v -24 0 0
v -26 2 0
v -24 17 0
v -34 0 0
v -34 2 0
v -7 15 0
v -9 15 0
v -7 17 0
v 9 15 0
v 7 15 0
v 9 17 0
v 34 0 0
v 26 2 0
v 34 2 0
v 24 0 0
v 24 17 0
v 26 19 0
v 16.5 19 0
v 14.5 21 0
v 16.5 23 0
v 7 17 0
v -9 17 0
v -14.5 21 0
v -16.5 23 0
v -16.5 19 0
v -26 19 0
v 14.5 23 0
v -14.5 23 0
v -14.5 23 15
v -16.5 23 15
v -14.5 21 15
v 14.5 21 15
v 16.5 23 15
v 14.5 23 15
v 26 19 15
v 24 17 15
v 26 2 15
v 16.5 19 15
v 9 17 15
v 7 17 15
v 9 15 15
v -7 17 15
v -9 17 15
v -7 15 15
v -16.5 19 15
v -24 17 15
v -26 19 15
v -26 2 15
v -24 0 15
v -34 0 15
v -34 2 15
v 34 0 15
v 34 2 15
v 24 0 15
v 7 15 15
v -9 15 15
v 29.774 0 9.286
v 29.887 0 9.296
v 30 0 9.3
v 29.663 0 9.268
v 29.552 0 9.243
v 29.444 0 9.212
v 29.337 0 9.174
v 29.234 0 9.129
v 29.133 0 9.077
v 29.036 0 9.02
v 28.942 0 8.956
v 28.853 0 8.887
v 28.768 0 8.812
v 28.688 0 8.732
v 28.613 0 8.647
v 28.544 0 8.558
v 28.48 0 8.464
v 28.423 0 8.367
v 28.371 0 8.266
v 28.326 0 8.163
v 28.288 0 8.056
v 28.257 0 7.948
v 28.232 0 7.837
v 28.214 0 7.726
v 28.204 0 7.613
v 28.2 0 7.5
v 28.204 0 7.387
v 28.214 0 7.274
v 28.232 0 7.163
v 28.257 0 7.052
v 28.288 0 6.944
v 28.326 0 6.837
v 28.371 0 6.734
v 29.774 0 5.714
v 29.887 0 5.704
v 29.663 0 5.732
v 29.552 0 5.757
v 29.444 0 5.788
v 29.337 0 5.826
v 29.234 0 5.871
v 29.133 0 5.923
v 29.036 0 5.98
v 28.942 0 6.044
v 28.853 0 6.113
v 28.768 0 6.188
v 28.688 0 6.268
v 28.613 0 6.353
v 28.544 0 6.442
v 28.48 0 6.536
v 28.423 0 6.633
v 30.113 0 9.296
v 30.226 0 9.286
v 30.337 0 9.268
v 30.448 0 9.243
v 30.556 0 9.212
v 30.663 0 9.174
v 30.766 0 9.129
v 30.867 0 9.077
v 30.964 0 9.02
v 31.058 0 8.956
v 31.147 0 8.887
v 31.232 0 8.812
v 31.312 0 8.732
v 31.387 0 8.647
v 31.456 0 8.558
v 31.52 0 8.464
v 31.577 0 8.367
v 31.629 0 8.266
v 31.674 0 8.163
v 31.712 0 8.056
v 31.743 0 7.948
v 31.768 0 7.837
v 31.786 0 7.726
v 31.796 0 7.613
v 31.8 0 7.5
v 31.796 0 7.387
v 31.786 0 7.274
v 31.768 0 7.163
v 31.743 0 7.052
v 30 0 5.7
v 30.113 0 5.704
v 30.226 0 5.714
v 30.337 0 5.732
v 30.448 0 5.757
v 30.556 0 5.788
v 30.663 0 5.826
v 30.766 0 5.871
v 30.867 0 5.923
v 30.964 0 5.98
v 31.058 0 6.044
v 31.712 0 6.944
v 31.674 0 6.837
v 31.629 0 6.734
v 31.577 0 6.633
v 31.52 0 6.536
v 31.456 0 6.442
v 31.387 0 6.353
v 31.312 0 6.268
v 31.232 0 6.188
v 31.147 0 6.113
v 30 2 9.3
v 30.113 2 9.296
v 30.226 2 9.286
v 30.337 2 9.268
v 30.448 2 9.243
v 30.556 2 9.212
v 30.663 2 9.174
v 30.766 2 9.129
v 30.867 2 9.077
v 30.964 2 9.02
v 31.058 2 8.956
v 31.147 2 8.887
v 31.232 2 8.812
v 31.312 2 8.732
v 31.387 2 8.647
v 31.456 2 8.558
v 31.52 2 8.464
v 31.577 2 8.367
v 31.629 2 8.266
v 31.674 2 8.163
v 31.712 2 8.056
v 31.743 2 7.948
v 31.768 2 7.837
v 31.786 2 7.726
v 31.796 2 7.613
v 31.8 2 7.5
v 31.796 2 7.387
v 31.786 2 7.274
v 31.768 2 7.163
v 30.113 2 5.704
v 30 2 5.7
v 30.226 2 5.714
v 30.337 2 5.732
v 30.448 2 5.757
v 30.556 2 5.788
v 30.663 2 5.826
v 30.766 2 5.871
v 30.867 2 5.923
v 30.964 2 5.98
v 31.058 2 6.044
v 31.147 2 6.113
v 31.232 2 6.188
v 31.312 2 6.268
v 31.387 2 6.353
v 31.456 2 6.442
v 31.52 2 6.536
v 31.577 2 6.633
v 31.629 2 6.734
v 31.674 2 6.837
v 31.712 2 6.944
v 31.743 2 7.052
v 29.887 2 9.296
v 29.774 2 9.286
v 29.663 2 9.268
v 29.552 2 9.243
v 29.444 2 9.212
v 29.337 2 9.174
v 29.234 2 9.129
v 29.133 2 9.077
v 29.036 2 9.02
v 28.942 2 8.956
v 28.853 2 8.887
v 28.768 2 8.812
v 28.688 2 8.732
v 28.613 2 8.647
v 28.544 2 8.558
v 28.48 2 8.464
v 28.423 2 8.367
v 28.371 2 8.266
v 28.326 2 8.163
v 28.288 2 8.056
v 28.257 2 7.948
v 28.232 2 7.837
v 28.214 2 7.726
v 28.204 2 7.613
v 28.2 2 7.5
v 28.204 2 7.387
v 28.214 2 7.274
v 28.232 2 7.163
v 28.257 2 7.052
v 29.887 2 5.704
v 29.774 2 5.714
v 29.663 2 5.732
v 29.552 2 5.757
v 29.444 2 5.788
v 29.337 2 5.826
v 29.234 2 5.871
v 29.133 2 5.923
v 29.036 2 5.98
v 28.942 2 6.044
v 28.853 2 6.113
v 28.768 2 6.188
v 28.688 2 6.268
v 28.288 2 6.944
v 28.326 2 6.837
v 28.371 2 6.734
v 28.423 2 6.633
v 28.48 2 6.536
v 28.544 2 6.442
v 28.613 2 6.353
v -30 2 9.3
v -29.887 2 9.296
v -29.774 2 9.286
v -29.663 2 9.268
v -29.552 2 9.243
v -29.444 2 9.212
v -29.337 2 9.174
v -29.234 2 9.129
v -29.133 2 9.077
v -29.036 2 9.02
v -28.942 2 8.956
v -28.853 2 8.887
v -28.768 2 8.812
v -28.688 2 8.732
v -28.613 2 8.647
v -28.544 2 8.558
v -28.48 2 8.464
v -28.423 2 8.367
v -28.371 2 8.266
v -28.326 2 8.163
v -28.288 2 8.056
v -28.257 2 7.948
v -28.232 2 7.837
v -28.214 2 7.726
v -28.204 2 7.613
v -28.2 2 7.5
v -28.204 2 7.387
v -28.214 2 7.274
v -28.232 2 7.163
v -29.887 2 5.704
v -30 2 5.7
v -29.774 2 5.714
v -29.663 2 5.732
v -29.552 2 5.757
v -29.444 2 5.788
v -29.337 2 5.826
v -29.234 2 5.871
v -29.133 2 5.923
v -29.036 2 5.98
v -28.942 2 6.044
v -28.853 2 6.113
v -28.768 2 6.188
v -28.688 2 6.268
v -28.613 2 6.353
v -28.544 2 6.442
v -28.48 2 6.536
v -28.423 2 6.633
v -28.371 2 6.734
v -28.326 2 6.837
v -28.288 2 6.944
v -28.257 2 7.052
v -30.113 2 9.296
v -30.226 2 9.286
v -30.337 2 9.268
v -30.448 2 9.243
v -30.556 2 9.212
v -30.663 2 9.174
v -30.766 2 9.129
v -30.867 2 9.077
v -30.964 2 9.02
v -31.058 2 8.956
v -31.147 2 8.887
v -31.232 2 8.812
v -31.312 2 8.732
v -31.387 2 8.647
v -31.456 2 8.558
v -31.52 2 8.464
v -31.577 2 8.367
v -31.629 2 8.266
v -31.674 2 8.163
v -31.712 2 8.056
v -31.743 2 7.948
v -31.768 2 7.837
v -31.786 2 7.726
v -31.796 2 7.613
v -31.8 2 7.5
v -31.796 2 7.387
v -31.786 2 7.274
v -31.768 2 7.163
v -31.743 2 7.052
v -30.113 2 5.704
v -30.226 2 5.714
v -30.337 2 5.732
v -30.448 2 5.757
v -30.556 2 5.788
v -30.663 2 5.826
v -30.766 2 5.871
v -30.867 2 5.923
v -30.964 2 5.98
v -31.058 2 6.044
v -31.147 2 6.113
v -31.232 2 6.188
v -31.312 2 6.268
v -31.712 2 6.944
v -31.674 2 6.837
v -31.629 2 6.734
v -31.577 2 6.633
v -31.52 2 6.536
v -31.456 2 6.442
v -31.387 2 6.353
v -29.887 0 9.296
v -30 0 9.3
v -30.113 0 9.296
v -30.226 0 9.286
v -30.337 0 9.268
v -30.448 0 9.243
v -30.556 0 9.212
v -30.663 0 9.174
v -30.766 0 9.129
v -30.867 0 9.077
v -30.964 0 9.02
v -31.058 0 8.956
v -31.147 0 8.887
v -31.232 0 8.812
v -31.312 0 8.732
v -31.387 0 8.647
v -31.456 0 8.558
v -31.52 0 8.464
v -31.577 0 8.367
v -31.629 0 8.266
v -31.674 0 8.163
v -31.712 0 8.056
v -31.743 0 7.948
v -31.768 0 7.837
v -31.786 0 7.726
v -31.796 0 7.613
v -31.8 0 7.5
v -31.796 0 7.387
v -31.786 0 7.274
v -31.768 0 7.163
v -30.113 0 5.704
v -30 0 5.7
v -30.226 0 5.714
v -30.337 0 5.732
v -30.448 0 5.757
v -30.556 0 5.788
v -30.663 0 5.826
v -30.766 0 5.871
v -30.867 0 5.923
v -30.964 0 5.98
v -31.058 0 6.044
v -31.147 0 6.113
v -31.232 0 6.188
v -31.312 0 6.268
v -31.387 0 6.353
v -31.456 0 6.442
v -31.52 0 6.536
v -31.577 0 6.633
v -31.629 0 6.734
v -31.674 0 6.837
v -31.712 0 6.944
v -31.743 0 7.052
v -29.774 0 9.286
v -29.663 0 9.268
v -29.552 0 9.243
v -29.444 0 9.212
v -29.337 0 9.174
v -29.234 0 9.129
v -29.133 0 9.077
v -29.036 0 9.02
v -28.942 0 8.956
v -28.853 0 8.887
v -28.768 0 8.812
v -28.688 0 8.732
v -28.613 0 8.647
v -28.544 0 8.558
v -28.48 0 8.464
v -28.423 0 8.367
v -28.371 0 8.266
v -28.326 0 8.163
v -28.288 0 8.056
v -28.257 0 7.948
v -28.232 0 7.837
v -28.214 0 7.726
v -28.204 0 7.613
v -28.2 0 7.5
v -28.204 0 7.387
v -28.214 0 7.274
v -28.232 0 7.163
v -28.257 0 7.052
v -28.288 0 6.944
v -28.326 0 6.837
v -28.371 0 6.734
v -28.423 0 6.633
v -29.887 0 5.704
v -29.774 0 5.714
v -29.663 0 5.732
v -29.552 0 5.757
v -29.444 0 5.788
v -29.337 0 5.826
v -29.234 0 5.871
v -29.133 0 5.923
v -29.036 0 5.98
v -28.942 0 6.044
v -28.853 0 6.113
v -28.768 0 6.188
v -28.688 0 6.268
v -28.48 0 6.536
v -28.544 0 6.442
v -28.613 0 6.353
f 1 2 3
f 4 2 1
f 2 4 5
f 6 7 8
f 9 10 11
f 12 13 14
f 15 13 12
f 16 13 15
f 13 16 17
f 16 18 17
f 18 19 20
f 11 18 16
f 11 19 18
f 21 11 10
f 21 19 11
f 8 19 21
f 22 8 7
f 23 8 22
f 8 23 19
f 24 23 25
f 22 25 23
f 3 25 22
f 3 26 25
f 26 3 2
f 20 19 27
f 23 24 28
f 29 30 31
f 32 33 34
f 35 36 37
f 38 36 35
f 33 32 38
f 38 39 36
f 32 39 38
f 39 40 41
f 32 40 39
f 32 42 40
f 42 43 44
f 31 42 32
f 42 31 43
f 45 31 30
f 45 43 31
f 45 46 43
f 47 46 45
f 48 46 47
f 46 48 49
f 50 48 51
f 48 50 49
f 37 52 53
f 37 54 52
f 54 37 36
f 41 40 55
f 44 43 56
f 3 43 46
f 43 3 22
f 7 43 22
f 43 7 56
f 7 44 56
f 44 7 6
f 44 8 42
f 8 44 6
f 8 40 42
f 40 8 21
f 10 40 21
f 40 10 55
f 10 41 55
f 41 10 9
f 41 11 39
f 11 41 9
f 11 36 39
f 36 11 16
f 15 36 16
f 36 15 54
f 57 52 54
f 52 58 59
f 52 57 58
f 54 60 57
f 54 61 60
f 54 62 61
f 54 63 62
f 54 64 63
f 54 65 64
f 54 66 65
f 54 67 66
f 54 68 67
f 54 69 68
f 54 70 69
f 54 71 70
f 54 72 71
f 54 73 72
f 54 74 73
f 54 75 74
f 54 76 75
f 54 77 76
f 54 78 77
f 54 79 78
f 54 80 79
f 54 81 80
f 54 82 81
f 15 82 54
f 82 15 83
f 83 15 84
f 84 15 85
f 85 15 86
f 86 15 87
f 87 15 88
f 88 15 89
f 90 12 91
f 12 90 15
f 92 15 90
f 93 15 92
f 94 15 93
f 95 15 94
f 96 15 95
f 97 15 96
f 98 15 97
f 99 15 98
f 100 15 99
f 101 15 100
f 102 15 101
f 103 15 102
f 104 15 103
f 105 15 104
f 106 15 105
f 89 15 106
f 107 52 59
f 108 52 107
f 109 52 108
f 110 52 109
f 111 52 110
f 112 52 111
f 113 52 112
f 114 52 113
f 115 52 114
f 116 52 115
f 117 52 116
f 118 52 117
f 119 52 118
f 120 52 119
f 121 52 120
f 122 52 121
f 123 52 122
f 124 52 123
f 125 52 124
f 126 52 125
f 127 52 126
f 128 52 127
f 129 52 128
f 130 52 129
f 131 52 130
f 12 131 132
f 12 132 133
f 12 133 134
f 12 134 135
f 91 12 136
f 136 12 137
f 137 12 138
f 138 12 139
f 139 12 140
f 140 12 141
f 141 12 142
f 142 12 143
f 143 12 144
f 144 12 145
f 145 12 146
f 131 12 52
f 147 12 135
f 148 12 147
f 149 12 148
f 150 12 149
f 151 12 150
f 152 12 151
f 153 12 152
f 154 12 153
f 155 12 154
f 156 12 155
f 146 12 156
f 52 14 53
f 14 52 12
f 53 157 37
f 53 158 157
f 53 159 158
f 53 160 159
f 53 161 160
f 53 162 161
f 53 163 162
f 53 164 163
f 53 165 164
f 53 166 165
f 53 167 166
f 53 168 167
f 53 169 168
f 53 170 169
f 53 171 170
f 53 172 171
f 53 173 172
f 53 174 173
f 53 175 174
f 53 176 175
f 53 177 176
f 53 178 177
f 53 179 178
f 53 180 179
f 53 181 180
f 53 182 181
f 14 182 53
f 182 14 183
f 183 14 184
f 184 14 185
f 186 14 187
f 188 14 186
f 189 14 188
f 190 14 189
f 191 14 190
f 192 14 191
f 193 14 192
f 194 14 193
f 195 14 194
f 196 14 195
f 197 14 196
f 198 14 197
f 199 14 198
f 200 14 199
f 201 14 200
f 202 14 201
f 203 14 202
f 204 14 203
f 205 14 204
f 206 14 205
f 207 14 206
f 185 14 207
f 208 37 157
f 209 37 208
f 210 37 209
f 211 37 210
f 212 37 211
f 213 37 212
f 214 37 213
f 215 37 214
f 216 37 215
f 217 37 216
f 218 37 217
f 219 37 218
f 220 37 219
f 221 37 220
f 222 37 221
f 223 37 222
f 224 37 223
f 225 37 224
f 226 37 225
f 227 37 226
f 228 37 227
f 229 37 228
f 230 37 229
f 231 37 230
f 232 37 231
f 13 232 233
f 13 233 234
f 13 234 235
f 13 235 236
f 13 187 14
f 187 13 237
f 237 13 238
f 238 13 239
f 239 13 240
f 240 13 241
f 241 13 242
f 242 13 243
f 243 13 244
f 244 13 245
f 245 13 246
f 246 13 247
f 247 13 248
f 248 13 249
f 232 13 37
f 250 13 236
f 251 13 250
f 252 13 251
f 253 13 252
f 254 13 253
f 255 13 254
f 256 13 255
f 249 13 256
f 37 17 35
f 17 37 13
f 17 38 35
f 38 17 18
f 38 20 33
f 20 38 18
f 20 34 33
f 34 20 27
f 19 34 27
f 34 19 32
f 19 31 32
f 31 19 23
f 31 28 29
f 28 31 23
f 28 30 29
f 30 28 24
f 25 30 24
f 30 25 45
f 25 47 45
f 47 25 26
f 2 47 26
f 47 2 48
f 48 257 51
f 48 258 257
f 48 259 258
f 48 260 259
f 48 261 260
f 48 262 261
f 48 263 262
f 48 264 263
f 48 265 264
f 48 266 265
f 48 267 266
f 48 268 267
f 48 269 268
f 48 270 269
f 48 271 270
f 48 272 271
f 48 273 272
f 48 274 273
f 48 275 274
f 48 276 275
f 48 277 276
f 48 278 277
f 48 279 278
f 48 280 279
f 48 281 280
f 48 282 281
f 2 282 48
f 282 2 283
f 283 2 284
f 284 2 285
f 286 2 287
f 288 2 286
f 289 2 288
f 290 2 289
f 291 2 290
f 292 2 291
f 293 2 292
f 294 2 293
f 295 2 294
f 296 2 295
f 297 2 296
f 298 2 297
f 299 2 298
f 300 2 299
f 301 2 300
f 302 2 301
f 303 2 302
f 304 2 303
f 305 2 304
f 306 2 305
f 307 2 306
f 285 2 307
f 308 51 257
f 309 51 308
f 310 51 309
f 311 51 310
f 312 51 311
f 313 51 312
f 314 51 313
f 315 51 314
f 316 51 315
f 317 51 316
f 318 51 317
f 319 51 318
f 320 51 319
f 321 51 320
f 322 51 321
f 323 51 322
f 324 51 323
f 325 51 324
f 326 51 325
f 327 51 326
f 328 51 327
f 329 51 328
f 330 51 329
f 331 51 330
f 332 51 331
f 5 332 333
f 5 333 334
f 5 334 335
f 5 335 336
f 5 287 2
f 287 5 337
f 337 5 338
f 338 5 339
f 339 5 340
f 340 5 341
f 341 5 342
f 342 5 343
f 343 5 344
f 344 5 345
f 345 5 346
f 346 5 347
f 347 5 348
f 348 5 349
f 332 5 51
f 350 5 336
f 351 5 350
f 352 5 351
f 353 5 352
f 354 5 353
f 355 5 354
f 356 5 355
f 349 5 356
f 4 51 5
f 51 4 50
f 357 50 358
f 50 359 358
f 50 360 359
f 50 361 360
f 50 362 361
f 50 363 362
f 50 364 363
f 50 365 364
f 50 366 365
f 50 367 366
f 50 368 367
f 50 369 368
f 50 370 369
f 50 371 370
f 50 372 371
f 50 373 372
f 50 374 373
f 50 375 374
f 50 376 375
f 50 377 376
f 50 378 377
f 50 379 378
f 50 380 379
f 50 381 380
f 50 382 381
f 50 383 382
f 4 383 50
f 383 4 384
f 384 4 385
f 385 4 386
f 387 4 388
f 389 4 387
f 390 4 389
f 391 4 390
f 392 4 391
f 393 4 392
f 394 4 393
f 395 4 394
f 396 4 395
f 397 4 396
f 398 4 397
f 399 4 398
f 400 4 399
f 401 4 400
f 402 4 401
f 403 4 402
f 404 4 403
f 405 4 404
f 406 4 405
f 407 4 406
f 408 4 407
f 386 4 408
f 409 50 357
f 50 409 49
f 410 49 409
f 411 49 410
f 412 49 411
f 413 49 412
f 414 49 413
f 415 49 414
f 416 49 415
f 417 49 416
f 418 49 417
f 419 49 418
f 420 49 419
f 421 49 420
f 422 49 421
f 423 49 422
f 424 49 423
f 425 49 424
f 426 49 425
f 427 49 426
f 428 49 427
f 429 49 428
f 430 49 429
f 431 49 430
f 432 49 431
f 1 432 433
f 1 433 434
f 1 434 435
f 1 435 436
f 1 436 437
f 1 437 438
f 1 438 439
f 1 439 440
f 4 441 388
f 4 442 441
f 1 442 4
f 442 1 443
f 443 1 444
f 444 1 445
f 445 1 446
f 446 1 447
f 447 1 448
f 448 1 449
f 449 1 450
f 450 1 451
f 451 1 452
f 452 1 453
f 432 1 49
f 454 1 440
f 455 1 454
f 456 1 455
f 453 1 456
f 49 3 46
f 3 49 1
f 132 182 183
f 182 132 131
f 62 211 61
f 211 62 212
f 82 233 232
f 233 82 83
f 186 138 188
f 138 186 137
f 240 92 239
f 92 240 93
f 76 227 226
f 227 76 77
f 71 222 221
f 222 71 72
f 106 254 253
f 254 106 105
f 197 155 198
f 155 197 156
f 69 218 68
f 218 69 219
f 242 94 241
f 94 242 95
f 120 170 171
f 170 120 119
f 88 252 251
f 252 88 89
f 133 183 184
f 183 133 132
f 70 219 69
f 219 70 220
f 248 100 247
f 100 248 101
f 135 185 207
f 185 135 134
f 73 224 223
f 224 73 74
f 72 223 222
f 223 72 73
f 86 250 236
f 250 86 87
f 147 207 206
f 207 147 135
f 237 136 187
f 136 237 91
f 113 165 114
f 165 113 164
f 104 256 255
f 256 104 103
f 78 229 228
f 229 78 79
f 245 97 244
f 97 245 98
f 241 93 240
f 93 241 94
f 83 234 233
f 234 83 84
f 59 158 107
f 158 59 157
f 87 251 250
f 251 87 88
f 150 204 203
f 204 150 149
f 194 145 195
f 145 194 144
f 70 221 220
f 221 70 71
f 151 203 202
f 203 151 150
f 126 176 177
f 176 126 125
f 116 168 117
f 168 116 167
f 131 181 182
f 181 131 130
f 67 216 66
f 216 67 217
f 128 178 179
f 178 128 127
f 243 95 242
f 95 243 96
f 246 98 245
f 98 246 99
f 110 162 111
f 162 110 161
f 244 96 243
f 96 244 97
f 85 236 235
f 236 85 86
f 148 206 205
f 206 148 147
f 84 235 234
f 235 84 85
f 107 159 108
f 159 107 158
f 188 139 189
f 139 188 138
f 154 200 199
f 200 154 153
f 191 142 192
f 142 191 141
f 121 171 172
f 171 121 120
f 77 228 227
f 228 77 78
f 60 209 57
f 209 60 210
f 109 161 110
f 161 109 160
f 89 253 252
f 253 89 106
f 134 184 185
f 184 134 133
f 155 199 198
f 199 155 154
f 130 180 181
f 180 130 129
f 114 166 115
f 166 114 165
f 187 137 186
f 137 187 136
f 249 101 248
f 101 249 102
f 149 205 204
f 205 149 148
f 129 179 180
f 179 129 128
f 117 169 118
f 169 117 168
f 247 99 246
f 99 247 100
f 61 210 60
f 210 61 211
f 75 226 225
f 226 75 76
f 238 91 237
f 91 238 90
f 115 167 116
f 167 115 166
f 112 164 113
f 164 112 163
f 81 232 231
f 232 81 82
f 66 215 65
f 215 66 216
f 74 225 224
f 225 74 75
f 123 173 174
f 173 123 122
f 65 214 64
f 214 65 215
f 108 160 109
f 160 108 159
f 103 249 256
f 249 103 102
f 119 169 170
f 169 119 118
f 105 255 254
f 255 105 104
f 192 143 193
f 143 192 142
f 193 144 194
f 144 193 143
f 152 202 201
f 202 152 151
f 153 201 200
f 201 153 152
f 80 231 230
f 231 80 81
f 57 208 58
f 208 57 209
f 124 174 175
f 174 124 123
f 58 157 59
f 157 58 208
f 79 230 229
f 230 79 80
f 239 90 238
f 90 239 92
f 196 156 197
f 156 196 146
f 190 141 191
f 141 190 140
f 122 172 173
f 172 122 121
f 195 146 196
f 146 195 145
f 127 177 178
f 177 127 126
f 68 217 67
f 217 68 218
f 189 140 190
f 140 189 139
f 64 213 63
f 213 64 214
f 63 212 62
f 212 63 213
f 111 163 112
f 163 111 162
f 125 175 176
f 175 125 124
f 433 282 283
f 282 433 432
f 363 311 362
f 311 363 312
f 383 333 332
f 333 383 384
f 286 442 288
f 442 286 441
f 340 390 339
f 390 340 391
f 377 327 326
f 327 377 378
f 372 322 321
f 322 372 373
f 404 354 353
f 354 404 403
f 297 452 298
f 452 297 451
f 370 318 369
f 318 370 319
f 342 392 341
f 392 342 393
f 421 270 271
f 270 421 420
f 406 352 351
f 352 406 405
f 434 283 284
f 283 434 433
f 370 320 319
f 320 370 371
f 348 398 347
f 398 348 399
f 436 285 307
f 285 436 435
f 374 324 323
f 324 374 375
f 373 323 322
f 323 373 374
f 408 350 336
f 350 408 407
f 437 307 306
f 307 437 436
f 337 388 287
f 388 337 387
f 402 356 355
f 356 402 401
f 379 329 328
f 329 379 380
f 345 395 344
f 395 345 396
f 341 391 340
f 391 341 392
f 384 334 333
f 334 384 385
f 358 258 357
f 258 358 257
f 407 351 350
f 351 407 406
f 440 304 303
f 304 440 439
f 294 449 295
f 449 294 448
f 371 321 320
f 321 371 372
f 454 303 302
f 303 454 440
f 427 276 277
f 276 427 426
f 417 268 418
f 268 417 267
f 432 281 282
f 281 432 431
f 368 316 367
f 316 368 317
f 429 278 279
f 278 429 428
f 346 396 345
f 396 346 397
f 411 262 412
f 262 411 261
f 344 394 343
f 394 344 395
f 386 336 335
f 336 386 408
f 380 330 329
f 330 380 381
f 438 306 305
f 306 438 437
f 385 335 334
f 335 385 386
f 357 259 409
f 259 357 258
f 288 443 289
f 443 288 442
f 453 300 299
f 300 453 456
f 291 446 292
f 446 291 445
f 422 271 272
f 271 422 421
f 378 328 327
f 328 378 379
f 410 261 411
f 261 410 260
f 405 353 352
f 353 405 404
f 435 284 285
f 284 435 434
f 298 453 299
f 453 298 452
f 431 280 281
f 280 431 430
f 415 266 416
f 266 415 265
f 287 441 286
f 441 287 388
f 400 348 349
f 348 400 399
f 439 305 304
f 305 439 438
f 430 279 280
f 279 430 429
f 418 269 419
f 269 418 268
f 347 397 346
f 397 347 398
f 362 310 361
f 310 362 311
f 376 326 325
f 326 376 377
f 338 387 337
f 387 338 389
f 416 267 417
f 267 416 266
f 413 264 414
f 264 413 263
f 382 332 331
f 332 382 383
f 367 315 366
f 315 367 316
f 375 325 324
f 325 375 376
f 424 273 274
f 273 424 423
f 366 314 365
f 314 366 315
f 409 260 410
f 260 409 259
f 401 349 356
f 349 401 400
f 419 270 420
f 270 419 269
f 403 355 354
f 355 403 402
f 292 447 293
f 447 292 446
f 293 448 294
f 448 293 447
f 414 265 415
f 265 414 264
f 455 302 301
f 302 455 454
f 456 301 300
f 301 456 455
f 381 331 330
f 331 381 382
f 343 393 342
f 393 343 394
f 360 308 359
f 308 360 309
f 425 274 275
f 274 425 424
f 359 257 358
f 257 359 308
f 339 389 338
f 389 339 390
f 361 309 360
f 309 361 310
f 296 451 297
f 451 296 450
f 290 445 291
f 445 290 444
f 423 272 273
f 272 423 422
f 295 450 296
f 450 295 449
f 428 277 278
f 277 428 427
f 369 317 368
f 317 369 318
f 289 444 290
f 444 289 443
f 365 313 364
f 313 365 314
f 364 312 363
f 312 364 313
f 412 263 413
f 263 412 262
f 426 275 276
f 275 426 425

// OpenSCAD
$fn=100;

width = 48;
height = 17;
board_width = 29;
board_length = 15;
thickness = 2;

difference () {
    linear_extrude (board_length) {
        polygon ([
            [-width/2-10, 0],
            [-width/2-10, thickness],
            [-width/2-thickness, thickness],
            [-width/2-thickness, thickness+height],
            [-board_width/2-thickness, thickness+height],
            [-board_width/2-thickness, thickness*3+height],
            [-board_width/2, thickness*3+height],
            [-board_width/2, thickness*2+height],
            [board_width/2, thickness*2+height],
            [board_width/2, thickness*3+height],
            [board_width/2+thickness, thickness*3+height],
            [board_width/2+thickness, thickness+height],
            [width/2+thickness, thickness+height],
            [width/2+thickness, thickness],
            [width/2+10, thickness],
            [width/2+10, 0],
            [width/2, 0],
            [width/2, height],
            [width/6+thickness/2, height],
            [width/6+thickness/2, height-thickness],
            [width/6-thickness/2, height-thickness],
            [width/6-thickness/2, height],
            [-width/6+thickness/2, height],
            [-width/6+thickness/2, height-thickness],
            [-width/6-thickness/2, height-thickness],
            [-width/6-thickness/2, height],
            [-width/2, height],
            [-width/2, 0],
        ]);
    }
    translate ([width/2+5 + thickness/2, 20, board_length/2])
    rotate([90, 0, 0])
    linear_extrude(40) circle(1.8);
    translate ([-width/2-5 - thickness/2, 20, board_length/2])
    rotate([90, 0, 0])
    linear_extrude(40) circle(1.8);
}
